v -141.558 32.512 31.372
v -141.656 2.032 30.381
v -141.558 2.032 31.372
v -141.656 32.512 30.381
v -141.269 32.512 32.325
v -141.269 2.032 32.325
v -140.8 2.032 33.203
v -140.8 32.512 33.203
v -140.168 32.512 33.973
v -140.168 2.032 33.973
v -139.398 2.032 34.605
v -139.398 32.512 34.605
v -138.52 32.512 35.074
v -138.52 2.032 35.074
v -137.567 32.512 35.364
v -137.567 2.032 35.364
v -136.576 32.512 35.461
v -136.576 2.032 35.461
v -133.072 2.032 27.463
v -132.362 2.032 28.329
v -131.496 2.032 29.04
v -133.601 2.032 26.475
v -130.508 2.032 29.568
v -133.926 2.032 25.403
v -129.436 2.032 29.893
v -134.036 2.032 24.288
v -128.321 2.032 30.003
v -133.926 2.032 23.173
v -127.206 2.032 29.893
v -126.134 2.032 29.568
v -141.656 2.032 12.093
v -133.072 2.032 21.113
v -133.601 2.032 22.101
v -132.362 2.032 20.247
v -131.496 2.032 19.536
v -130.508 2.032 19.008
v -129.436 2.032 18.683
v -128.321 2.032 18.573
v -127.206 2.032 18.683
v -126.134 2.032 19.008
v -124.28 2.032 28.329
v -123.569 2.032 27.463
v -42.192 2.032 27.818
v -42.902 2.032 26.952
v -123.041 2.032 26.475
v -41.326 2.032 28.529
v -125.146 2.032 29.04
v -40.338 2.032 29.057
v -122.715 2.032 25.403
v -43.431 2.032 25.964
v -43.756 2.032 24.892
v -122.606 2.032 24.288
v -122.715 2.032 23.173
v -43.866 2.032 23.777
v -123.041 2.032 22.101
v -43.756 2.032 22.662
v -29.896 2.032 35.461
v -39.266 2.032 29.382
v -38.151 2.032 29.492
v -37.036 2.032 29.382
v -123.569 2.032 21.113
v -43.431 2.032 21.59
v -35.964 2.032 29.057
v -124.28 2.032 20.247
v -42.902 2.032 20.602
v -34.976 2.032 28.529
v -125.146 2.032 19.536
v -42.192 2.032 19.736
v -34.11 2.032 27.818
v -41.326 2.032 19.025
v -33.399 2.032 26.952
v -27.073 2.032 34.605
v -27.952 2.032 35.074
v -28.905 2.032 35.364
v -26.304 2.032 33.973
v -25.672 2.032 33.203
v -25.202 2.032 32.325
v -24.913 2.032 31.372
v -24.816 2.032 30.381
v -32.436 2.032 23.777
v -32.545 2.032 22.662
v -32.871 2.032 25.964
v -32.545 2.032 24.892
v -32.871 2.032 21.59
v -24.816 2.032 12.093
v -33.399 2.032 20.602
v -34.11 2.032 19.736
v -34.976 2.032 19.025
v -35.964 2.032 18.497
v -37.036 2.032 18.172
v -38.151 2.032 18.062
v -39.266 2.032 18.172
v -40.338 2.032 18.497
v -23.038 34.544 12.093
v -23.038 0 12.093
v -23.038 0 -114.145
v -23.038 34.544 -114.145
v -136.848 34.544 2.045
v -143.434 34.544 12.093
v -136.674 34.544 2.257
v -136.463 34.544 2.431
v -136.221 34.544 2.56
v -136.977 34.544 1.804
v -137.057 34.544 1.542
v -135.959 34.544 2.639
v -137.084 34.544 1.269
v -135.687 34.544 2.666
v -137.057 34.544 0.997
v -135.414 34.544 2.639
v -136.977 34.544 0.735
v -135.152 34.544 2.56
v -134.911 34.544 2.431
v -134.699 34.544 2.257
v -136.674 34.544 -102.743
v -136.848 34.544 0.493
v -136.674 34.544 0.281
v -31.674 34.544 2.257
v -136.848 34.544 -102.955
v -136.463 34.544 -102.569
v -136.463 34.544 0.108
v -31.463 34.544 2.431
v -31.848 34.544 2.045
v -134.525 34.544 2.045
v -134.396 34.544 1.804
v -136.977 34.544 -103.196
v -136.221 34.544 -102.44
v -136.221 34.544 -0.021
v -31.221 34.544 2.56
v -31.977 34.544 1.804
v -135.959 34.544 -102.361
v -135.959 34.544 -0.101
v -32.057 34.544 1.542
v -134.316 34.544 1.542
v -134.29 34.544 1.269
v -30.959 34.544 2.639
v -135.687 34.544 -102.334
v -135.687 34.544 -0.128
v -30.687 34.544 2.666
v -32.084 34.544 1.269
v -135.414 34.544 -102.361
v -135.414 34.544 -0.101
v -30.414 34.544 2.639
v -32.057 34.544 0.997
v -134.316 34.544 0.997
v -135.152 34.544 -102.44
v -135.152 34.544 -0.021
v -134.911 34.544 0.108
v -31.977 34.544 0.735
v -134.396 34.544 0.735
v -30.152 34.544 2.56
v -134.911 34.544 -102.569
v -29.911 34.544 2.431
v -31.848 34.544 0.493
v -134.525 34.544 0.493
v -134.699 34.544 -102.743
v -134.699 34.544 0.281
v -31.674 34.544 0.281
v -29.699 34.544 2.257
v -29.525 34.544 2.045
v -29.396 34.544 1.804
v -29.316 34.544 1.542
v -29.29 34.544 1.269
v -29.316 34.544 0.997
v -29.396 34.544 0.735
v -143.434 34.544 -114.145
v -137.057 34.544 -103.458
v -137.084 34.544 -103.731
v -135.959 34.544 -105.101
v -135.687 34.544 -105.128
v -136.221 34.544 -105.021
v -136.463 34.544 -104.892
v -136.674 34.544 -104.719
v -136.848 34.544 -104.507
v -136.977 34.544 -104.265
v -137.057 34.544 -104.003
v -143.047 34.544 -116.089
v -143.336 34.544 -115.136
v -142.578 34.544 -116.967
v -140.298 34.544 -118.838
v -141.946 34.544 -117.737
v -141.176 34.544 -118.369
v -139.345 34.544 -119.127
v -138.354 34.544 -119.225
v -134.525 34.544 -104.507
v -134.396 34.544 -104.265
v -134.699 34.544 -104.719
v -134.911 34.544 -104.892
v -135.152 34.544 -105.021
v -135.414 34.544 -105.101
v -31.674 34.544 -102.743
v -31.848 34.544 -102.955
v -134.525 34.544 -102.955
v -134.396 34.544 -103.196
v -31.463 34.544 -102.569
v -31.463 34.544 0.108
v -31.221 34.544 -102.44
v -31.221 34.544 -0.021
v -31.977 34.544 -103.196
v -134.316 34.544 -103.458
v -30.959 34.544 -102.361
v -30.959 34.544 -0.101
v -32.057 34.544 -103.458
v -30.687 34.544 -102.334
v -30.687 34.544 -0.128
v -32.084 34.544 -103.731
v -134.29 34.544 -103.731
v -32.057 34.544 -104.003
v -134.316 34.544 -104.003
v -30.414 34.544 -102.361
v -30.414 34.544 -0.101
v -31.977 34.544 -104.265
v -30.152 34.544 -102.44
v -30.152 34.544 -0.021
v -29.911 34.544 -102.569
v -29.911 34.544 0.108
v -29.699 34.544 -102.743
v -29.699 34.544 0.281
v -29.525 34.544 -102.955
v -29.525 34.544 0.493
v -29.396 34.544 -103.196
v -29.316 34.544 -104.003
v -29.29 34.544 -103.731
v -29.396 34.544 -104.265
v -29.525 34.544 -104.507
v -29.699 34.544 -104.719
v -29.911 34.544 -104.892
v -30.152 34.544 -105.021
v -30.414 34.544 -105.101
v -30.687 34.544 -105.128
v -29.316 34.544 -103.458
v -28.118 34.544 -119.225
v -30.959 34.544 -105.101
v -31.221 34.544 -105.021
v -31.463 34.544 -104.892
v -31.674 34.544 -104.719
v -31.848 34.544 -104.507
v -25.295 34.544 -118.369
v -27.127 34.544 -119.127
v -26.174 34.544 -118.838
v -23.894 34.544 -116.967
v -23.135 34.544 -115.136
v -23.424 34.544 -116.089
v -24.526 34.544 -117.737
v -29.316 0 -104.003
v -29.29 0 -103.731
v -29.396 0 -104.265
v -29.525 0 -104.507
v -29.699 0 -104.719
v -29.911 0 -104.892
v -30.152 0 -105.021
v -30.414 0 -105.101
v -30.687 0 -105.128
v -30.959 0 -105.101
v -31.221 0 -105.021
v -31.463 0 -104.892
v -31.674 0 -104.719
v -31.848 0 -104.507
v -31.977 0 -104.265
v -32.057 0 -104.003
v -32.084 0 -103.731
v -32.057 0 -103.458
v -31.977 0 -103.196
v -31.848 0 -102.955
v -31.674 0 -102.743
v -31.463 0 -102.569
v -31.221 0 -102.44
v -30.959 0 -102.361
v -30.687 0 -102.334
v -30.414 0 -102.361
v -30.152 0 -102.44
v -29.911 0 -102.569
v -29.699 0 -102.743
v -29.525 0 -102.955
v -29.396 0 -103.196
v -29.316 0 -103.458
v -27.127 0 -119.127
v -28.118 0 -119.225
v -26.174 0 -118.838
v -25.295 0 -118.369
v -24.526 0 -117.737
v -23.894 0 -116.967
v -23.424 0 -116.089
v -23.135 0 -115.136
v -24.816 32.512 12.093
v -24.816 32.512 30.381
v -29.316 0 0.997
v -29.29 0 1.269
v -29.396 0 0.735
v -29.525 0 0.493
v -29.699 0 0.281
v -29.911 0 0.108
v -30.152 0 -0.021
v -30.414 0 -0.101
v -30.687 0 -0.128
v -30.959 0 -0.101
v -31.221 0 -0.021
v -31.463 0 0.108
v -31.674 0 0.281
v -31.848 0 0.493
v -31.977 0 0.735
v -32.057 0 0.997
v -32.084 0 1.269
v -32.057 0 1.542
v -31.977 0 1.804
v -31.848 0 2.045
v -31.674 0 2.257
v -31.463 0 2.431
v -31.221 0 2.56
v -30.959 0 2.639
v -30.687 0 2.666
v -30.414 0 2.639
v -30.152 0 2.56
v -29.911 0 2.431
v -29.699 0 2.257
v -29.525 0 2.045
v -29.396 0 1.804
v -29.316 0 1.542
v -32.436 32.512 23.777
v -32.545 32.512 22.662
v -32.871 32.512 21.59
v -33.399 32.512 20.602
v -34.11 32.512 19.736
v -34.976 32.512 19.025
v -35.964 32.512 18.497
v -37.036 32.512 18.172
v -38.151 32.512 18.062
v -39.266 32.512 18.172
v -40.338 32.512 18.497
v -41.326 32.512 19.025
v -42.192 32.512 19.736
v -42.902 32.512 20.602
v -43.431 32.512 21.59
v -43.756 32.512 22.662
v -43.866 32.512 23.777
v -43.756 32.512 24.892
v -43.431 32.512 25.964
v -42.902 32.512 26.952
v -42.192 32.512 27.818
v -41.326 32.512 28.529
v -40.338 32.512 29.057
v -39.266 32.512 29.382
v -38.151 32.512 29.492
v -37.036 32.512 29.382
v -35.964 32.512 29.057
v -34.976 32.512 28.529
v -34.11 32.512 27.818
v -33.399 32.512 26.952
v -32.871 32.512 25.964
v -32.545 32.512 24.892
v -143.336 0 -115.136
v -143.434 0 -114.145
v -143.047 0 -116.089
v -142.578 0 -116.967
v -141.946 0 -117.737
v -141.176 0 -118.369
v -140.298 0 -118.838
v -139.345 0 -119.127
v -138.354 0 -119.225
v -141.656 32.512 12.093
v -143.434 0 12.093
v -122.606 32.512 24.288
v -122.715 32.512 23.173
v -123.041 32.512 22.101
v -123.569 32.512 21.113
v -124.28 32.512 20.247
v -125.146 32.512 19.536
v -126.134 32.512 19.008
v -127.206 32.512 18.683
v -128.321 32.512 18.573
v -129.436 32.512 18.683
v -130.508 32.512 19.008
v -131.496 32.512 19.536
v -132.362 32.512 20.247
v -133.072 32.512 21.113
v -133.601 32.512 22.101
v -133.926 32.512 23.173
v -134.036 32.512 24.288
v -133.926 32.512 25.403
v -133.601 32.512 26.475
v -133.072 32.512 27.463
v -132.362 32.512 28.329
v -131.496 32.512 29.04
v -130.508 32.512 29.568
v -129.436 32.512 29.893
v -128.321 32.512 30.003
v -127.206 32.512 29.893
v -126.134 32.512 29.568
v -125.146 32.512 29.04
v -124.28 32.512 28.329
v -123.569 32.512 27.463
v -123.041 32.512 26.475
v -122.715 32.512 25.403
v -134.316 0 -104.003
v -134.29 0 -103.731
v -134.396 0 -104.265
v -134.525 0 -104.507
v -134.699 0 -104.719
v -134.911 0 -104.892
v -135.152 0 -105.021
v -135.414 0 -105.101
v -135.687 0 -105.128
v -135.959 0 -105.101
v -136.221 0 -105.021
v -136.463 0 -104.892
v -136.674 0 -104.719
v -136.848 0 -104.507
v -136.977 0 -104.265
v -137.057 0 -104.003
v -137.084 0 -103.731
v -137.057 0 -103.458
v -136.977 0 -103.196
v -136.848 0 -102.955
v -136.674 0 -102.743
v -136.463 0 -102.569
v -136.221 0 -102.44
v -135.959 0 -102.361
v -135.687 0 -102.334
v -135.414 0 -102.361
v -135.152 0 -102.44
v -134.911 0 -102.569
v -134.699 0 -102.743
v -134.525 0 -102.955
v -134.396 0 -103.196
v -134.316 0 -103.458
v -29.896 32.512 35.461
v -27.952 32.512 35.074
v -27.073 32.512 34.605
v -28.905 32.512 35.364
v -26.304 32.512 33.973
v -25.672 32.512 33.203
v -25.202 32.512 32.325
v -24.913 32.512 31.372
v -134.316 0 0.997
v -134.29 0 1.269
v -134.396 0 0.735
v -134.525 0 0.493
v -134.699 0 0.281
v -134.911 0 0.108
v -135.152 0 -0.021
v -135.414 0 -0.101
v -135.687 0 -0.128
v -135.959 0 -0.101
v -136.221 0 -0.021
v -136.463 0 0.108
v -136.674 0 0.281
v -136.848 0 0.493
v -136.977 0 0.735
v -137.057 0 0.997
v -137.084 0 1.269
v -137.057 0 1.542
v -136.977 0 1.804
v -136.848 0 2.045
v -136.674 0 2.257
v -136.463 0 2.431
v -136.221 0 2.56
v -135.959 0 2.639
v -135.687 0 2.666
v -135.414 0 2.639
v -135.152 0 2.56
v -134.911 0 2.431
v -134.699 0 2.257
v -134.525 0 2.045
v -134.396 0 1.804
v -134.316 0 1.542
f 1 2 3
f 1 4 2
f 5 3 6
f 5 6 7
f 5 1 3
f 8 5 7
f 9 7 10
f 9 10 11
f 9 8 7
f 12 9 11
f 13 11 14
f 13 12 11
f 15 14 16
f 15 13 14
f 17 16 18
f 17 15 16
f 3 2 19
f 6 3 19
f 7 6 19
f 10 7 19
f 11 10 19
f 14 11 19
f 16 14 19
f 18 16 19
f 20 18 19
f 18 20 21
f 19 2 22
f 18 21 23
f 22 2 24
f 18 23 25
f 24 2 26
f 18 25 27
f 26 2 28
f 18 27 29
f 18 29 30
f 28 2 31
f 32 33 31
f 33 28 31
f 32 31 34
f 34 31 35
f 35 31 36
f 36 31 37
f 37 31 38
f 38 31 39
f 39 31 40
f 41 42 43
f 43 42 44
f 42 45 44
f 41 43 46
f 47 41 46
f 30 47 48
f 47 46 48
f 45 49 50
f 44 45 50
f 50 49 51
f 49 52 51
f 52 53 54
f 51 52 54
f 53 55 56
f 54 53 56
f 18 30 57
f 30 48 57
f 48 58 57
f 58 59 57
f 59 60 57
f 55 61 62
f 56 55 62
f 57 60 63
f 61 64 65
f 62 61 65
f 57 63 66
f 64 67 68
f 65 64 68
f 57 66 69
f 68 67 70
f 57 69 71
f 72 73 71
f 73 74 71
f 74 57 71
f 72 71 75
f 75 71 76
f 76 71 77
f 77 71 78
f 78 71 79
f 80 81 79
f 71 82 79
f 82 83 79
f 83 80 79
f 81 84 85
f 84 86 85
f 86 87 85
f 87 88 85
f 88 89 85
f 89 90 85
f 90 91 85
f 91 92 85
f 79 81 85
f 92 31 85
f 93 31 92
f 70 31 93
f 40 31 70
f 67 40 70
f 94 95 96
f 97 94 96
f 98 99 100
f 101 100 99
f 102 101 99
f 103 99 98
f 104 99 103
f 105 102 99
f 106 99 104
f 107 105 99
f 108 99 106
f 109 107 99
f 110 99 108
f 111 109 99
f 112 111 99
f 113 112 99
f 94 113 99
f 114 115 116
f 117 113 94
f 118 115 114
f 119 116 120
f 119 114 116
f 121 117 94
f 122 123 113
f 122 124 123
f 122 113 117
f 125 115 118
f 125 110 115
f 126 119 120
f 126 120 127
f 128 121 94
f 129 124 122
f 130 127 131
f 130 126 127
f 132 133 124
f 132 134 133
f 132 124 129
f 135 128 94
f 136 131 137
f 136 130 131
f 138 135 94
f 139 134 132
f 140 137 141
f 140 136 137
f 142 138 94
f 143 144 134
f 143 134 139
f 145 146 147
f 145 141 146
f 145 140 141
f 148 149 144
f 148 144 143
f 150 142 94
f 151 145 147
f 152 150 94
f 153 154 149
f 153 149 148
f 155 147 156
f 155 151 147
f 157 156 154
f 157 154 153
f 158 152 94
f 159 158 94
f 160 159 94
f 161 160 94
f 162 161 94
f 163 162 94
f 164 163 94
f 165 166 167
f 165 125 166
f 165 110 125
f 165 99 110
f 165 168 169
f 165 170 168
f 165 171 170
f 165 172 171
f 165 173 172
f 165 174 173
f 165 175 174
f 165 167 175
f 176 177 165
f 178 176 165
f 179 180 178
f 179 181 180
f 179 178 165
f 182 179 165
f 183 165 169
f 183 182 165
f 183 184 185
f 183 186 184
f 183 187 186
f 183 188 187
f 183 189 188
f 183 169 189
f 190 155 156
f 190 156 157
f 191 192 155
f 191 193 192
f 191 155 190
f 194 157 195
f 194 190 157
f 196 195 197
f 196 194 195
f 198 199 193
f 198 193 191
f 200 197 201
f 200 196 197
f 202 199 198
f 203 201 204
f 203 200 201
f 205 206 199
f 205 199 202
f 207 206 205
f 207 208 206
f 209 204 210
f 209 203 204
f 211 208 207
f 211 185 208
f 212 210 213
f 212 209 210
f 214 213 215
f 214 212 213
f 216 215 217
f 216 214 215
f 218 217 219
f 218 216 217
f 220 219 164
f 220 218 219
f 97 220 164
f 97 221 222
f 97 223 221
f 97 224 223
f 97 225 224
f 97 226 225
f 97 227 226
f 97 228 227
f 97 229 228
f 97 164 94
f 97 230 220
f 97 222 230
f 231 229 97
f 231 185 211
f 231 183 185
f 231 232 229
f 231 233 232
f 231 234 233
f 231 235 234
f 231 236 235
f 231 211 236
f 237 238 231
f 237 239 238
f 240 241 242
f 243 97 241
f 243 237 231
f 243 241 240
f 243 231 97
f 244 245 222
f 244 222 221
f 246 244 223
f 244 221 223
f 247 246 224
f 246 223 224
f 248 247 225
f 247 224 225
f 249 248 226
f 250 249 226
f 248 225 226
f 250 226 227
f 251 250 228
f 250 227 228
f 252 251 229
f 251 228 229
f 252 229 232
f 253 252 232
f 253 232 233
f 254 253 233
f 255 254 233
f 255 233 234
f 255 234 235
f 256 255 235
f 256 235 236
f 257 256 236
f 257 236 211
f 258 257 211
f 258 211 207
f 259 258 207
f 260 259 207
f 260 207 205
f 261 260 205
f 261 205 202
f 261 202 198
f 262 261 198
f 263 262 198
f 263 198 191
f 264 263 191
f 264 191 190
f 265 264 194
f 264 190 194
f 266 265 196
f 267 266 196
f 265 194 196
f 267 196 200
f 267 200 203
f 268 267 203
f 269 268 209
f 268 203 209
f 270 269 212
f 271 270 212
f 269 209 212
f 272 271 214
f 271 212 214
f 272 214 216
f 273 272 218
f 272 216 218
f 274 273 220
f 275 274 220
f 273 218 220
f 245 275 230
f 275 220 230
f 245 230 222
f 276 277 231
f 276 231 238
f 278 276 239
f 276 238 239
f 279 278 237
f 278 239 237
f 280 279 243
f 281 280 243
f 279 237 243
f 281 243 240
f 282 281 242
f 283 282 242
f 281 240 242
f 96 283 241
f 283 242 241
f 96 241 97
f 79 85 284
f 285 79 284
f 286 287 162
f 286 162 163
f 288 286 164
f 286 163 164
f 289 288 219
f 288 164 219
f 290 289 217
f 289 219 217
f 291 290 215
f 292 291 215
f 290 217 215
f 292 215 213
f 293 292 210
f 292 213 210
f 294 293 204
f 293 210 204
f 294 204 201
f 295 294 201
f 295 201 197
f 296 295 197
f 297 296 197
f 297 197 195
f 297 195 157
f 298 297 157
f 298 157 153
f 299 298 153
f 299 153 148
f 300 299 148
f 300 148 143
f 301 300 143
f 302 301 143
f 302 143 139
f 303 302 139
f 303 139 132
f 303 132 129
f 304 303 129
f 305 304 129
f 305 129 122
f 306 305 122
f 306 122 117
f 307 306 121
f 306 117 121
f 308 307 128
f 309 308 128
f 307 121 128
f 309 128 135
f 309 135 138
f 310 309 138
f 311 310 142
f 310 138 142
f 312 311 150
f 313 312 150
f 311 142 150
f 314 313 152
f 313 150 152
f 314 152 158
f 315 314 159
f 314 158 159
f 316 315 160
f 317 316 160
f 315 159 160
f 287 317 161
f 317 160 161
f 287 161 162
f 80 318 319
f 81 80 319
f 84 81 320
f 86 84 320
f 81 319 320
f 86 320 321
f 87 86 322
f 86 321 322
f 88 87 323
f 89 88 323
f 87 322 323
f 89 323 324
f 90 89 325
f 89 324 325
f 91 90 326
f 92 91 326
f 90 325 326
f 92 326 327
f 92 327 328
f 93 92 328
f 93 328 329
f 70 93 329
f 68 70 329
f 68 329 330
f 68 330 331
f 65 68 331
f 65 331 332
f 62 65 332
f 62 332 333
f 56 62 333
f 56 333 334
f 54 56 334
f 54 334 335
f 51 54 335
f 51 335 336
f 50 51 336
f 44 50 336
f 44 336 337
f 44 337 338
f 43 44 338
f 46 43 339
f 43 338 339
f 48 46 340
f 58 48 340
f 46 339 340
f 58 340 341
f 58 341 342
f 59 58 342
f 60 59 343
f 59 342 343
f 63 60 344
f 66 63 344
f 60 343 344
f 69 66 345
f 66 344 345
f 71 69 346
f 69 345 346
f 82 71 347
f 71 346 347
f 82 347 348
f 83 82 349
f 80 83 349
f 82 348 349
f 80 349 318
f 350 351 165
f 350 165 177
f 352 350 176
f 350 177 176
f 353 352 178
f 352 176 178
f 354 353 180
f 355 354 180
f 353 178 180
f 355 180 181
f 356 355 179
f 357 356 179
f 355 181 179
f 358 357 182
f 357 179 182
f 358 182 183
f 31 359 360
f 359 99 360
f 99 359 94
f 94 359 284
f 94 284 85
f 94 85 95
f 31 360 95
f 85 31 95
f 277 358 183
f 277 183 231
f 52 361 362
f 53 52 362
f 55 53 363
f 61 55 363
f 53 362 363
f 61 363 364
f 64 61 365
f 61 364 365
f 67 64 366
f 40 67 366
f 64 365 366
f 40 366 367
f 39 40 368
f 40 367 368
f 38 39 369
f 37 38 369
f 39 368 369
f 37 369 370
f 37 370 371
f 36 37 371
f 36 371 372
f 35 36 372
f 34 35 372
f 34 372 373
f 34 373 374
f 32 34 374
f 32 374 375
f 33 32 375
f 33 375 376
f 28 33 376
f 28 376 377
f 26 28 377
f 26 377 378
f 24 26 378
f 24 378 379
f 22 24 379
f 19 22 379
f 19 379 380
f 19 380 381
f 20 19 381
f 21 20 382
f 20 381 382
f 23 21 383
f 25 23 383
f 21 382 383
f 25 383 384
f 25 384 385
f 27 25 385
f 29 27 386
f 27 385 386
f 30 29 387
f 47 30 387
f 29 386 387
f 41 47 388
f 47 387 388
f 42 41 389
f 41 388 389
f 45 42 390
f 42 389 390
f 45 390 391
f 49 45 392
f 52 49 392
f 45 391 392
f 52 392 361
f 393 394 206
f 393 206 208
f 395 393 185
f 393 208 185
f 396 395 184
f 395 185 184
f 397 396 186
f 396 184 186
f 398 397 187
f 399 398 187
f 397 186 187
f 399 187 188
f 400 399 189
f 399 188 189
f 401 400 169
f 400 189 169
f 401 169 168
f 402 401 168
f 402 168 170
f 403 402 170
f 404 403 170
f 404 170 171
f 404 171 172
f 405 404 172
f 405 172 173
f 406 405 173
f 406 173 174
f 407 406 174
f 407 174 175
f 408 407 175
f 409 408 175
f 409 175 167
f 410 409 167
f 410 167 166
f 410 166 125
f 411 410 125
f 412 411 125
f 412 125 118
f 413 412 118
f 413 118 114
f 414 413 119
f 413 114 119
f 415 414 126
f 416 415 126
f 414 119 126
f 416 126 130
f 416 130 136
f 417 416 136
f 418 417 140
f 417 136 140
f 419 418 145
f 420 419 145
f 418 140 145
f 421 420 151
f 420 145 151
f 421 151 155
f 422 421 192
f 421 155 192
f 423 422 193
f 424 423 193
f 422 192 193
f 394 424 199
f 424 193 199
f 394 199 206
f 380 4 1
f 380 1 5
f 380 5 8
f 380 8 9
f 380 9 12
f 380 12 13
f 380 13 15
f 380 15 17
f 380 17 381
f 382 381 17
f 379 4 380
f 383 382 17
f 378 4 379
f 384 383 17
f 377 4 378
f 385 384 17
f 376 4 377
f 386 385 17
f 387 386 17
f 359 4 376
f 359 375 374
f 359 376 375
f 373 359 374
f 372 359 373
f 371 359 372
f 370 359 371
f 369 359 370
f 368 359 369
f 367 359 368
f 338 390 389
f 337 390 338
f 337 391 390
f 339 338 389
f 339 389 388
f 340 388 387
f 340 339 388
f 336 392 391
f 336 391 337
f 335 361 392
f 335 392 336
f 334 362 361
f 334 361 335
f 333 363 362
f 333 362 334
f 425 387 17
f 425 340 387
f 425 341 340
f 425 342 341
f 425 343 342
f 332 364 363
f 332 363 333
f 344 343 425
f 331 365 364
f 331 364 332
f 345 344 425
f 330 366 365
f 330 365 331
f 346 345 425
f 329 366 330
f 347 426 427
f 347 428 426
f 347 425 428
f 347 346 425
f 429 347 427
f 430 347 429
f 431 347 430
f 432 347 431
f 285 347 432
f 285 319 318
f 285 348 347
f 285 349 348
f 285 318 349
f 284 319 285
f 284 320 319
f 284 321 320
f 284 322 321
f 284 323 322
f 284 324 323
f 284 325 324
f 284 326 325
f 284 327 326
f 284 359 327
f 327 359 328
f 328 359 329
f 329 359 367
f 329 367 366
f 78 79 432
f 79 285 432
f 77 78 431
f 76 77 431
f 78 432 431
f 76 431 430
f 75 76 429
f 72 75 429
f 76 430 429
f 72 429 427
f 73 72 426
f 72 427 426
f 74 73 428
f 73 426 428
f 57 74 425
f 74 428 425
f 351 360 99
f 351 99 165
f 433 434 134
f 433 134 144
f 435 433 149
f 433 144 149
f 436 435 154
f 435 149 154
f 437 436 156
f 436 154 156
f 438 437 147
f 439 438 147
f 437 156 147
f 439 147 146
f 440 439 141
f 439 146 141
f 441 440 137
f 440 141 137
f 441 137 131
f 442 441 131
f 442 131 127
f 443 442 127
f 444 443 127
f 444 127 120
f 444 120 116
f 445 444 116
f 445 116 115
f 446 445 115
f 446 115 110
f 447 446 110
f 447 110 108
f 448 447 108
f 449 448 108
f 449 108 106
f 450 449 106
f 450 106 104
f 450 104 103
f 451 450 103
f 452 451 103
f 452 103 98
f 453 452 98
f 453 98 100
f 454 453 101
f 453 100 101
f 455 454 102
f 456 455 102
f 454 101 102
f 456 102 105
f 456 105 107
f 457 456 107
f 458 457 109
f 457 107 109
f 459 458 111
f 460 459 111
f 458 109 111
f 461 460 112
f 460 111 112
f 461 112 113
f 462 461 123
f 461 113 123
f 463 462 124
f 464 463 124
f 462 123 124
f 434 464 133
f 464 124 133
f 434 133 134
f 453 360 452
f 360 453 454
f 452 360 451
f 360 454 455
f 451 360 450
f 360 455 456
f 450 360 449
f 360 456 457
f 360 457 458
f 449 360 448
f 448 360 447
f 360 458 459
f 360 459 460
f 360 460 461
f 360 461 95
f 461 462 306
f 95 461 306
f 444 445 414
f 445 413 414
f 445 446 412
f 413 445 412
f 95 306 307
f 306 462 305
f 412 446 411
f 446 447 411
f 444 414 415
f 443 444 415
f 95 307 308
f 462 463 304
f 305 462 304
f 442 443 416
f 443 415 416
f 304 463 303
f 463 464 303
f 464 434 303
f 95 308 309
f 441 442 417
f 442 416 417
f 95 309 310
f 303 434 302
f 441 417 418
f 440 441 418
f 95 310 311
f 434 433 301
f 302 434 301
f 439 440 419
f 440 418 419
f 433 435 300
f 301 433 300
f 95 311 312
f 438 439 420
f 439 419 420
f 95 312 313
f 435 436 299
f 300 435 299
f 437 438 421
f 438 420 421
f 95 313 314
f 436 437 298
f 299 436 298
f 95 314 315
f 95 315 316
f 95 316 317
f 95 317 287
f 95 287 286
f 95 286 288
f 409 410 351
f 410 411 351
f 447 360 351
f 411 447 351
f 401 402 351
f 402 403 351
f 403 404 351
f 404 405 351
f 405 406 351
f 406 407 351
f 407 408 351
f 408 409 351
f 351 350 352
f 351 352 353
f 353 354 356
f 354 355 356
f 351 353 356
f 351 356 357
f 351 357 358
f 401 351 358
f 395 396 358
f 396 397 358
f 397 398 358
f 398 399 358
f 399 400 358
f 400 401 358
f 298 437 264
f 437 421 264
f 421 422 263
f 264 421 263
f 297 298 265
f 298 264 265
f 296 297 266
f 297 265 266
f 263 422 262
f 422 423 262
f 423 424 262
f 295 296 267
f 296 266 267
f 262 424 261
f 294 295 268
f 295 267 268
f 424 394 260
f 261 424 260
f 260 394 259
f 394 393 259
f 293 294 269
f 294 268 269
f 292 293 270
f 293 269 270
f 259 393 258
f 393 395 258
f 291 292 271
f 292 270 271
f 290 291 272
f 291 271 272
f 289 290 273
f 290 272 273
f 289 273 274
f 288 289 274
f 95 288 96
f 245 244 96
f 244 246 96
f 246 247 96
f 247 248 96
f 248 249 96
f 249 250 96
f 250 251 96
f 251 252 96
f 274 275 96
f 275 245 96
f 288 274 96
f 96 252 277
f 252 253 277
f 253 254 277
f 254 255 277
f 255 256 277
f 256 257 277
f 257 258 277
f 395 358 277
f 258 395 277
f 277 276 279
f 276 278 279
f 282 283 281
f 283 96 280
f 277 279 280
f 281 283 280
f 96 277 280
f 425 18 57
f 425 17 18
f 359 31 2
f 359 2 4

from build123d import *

# Parameters (mm, degrees)
SKETCH1_W           = 120.396
SKETCH1_H           = 131.318
BOSS_EXTRUDE1_DEPTH = 34.544
SKETCH2_R           = 1.397
CUT_EXTRUDE1_DEPTH  = 35.544
SKETCH3_W           = 116.84
SKETCH3_H           = 30.48
BOSS_EXTRUDE2_DEPTH = 23.368
SKETCH4_R           = 5.715
CUT_EXTRUDE2_DEPTH  = 33.512
FILLET1_R           = 5.08


with BuildPart() as part:
    # Sketch1 → Boss-Extrude1 (new body)
    with BuildSketch(Plane(origin=(0, 0, 0), x_dir=(1, 0, 0), z_dir=(0, 1, 0))):
        with Locations((-83.235647386, 53.565832685)):
            Rectangle(SKETCH1_W, SKETCH1_H)
    extrude(amount=BOSS_EXTRUDE1_DEPTH)

    # Sketch2 → Cut-Extrude1 (cut, through all)
    with BuildSketch(Plane(origin=(0, 34.544, 0), x_dir=(1, 0, 0), z_dir=(0, 1, 0))):
        with Locations((-135.686647386, 103.730832685)):
            Circle(SKETCH2_R)
        with Locations((-30.686647386, 103.730832685)):
            Circle(SKETCH2_R)
        with Locations((-135.686647386, -1.269167315)):
            Circle(SKETCH2_R)
        with Locations((-30.686647328, -1.269167315)):
            Circle(SKETCH2_R)
    extrude(amount=-CUT_EXTRUDE1_DEPTH, mode=Mode.SUBTRACT)

    # Sketch3 → Boss-Extrude2 (add)
    with BuildSketch(Plane.XY.offset(12.093167315)):
        with Locations((-83.235647386, 17.272)):
            Rectangle(SKETCH3_W, SKETCH3_H)
    extrude(amount=BOSS_EXTRUDE2_DEPTH)

    # Sketch4 → Cut-Extrude2 (cut, through all)
    with BuildSketch(Plane(origin=(0, 32.512, 0), x_dir=(1, 0, 0), z_dir=(0, 1, 0))):
        with Locations((-128.320647386, -24.288198654)):
            Circle(SKETCH4_R)
        with Locations((-38.150647386, -23.777167315)):
            Circle(SKETCH4_R)
    extrude(amount=-CUT_EXTRUDE2_DEPTH, mode=Mode.SUBTRACT)

    # Fillet1
    fillet1_edges = [part.edges().sort_by_distance(p)[0] for p in [
        (-24.815647386, 17.272, 35.461167315),
        (-141.655647386, 17.272, 35.461167315),
        (-143.433647386, 17.272, -119.224832685),
        (-23.037647386, 17.272, -119.224832685),
    ]]
    fillet(fillet1_edges, radius=FILLET1_R)


solid = part.part
